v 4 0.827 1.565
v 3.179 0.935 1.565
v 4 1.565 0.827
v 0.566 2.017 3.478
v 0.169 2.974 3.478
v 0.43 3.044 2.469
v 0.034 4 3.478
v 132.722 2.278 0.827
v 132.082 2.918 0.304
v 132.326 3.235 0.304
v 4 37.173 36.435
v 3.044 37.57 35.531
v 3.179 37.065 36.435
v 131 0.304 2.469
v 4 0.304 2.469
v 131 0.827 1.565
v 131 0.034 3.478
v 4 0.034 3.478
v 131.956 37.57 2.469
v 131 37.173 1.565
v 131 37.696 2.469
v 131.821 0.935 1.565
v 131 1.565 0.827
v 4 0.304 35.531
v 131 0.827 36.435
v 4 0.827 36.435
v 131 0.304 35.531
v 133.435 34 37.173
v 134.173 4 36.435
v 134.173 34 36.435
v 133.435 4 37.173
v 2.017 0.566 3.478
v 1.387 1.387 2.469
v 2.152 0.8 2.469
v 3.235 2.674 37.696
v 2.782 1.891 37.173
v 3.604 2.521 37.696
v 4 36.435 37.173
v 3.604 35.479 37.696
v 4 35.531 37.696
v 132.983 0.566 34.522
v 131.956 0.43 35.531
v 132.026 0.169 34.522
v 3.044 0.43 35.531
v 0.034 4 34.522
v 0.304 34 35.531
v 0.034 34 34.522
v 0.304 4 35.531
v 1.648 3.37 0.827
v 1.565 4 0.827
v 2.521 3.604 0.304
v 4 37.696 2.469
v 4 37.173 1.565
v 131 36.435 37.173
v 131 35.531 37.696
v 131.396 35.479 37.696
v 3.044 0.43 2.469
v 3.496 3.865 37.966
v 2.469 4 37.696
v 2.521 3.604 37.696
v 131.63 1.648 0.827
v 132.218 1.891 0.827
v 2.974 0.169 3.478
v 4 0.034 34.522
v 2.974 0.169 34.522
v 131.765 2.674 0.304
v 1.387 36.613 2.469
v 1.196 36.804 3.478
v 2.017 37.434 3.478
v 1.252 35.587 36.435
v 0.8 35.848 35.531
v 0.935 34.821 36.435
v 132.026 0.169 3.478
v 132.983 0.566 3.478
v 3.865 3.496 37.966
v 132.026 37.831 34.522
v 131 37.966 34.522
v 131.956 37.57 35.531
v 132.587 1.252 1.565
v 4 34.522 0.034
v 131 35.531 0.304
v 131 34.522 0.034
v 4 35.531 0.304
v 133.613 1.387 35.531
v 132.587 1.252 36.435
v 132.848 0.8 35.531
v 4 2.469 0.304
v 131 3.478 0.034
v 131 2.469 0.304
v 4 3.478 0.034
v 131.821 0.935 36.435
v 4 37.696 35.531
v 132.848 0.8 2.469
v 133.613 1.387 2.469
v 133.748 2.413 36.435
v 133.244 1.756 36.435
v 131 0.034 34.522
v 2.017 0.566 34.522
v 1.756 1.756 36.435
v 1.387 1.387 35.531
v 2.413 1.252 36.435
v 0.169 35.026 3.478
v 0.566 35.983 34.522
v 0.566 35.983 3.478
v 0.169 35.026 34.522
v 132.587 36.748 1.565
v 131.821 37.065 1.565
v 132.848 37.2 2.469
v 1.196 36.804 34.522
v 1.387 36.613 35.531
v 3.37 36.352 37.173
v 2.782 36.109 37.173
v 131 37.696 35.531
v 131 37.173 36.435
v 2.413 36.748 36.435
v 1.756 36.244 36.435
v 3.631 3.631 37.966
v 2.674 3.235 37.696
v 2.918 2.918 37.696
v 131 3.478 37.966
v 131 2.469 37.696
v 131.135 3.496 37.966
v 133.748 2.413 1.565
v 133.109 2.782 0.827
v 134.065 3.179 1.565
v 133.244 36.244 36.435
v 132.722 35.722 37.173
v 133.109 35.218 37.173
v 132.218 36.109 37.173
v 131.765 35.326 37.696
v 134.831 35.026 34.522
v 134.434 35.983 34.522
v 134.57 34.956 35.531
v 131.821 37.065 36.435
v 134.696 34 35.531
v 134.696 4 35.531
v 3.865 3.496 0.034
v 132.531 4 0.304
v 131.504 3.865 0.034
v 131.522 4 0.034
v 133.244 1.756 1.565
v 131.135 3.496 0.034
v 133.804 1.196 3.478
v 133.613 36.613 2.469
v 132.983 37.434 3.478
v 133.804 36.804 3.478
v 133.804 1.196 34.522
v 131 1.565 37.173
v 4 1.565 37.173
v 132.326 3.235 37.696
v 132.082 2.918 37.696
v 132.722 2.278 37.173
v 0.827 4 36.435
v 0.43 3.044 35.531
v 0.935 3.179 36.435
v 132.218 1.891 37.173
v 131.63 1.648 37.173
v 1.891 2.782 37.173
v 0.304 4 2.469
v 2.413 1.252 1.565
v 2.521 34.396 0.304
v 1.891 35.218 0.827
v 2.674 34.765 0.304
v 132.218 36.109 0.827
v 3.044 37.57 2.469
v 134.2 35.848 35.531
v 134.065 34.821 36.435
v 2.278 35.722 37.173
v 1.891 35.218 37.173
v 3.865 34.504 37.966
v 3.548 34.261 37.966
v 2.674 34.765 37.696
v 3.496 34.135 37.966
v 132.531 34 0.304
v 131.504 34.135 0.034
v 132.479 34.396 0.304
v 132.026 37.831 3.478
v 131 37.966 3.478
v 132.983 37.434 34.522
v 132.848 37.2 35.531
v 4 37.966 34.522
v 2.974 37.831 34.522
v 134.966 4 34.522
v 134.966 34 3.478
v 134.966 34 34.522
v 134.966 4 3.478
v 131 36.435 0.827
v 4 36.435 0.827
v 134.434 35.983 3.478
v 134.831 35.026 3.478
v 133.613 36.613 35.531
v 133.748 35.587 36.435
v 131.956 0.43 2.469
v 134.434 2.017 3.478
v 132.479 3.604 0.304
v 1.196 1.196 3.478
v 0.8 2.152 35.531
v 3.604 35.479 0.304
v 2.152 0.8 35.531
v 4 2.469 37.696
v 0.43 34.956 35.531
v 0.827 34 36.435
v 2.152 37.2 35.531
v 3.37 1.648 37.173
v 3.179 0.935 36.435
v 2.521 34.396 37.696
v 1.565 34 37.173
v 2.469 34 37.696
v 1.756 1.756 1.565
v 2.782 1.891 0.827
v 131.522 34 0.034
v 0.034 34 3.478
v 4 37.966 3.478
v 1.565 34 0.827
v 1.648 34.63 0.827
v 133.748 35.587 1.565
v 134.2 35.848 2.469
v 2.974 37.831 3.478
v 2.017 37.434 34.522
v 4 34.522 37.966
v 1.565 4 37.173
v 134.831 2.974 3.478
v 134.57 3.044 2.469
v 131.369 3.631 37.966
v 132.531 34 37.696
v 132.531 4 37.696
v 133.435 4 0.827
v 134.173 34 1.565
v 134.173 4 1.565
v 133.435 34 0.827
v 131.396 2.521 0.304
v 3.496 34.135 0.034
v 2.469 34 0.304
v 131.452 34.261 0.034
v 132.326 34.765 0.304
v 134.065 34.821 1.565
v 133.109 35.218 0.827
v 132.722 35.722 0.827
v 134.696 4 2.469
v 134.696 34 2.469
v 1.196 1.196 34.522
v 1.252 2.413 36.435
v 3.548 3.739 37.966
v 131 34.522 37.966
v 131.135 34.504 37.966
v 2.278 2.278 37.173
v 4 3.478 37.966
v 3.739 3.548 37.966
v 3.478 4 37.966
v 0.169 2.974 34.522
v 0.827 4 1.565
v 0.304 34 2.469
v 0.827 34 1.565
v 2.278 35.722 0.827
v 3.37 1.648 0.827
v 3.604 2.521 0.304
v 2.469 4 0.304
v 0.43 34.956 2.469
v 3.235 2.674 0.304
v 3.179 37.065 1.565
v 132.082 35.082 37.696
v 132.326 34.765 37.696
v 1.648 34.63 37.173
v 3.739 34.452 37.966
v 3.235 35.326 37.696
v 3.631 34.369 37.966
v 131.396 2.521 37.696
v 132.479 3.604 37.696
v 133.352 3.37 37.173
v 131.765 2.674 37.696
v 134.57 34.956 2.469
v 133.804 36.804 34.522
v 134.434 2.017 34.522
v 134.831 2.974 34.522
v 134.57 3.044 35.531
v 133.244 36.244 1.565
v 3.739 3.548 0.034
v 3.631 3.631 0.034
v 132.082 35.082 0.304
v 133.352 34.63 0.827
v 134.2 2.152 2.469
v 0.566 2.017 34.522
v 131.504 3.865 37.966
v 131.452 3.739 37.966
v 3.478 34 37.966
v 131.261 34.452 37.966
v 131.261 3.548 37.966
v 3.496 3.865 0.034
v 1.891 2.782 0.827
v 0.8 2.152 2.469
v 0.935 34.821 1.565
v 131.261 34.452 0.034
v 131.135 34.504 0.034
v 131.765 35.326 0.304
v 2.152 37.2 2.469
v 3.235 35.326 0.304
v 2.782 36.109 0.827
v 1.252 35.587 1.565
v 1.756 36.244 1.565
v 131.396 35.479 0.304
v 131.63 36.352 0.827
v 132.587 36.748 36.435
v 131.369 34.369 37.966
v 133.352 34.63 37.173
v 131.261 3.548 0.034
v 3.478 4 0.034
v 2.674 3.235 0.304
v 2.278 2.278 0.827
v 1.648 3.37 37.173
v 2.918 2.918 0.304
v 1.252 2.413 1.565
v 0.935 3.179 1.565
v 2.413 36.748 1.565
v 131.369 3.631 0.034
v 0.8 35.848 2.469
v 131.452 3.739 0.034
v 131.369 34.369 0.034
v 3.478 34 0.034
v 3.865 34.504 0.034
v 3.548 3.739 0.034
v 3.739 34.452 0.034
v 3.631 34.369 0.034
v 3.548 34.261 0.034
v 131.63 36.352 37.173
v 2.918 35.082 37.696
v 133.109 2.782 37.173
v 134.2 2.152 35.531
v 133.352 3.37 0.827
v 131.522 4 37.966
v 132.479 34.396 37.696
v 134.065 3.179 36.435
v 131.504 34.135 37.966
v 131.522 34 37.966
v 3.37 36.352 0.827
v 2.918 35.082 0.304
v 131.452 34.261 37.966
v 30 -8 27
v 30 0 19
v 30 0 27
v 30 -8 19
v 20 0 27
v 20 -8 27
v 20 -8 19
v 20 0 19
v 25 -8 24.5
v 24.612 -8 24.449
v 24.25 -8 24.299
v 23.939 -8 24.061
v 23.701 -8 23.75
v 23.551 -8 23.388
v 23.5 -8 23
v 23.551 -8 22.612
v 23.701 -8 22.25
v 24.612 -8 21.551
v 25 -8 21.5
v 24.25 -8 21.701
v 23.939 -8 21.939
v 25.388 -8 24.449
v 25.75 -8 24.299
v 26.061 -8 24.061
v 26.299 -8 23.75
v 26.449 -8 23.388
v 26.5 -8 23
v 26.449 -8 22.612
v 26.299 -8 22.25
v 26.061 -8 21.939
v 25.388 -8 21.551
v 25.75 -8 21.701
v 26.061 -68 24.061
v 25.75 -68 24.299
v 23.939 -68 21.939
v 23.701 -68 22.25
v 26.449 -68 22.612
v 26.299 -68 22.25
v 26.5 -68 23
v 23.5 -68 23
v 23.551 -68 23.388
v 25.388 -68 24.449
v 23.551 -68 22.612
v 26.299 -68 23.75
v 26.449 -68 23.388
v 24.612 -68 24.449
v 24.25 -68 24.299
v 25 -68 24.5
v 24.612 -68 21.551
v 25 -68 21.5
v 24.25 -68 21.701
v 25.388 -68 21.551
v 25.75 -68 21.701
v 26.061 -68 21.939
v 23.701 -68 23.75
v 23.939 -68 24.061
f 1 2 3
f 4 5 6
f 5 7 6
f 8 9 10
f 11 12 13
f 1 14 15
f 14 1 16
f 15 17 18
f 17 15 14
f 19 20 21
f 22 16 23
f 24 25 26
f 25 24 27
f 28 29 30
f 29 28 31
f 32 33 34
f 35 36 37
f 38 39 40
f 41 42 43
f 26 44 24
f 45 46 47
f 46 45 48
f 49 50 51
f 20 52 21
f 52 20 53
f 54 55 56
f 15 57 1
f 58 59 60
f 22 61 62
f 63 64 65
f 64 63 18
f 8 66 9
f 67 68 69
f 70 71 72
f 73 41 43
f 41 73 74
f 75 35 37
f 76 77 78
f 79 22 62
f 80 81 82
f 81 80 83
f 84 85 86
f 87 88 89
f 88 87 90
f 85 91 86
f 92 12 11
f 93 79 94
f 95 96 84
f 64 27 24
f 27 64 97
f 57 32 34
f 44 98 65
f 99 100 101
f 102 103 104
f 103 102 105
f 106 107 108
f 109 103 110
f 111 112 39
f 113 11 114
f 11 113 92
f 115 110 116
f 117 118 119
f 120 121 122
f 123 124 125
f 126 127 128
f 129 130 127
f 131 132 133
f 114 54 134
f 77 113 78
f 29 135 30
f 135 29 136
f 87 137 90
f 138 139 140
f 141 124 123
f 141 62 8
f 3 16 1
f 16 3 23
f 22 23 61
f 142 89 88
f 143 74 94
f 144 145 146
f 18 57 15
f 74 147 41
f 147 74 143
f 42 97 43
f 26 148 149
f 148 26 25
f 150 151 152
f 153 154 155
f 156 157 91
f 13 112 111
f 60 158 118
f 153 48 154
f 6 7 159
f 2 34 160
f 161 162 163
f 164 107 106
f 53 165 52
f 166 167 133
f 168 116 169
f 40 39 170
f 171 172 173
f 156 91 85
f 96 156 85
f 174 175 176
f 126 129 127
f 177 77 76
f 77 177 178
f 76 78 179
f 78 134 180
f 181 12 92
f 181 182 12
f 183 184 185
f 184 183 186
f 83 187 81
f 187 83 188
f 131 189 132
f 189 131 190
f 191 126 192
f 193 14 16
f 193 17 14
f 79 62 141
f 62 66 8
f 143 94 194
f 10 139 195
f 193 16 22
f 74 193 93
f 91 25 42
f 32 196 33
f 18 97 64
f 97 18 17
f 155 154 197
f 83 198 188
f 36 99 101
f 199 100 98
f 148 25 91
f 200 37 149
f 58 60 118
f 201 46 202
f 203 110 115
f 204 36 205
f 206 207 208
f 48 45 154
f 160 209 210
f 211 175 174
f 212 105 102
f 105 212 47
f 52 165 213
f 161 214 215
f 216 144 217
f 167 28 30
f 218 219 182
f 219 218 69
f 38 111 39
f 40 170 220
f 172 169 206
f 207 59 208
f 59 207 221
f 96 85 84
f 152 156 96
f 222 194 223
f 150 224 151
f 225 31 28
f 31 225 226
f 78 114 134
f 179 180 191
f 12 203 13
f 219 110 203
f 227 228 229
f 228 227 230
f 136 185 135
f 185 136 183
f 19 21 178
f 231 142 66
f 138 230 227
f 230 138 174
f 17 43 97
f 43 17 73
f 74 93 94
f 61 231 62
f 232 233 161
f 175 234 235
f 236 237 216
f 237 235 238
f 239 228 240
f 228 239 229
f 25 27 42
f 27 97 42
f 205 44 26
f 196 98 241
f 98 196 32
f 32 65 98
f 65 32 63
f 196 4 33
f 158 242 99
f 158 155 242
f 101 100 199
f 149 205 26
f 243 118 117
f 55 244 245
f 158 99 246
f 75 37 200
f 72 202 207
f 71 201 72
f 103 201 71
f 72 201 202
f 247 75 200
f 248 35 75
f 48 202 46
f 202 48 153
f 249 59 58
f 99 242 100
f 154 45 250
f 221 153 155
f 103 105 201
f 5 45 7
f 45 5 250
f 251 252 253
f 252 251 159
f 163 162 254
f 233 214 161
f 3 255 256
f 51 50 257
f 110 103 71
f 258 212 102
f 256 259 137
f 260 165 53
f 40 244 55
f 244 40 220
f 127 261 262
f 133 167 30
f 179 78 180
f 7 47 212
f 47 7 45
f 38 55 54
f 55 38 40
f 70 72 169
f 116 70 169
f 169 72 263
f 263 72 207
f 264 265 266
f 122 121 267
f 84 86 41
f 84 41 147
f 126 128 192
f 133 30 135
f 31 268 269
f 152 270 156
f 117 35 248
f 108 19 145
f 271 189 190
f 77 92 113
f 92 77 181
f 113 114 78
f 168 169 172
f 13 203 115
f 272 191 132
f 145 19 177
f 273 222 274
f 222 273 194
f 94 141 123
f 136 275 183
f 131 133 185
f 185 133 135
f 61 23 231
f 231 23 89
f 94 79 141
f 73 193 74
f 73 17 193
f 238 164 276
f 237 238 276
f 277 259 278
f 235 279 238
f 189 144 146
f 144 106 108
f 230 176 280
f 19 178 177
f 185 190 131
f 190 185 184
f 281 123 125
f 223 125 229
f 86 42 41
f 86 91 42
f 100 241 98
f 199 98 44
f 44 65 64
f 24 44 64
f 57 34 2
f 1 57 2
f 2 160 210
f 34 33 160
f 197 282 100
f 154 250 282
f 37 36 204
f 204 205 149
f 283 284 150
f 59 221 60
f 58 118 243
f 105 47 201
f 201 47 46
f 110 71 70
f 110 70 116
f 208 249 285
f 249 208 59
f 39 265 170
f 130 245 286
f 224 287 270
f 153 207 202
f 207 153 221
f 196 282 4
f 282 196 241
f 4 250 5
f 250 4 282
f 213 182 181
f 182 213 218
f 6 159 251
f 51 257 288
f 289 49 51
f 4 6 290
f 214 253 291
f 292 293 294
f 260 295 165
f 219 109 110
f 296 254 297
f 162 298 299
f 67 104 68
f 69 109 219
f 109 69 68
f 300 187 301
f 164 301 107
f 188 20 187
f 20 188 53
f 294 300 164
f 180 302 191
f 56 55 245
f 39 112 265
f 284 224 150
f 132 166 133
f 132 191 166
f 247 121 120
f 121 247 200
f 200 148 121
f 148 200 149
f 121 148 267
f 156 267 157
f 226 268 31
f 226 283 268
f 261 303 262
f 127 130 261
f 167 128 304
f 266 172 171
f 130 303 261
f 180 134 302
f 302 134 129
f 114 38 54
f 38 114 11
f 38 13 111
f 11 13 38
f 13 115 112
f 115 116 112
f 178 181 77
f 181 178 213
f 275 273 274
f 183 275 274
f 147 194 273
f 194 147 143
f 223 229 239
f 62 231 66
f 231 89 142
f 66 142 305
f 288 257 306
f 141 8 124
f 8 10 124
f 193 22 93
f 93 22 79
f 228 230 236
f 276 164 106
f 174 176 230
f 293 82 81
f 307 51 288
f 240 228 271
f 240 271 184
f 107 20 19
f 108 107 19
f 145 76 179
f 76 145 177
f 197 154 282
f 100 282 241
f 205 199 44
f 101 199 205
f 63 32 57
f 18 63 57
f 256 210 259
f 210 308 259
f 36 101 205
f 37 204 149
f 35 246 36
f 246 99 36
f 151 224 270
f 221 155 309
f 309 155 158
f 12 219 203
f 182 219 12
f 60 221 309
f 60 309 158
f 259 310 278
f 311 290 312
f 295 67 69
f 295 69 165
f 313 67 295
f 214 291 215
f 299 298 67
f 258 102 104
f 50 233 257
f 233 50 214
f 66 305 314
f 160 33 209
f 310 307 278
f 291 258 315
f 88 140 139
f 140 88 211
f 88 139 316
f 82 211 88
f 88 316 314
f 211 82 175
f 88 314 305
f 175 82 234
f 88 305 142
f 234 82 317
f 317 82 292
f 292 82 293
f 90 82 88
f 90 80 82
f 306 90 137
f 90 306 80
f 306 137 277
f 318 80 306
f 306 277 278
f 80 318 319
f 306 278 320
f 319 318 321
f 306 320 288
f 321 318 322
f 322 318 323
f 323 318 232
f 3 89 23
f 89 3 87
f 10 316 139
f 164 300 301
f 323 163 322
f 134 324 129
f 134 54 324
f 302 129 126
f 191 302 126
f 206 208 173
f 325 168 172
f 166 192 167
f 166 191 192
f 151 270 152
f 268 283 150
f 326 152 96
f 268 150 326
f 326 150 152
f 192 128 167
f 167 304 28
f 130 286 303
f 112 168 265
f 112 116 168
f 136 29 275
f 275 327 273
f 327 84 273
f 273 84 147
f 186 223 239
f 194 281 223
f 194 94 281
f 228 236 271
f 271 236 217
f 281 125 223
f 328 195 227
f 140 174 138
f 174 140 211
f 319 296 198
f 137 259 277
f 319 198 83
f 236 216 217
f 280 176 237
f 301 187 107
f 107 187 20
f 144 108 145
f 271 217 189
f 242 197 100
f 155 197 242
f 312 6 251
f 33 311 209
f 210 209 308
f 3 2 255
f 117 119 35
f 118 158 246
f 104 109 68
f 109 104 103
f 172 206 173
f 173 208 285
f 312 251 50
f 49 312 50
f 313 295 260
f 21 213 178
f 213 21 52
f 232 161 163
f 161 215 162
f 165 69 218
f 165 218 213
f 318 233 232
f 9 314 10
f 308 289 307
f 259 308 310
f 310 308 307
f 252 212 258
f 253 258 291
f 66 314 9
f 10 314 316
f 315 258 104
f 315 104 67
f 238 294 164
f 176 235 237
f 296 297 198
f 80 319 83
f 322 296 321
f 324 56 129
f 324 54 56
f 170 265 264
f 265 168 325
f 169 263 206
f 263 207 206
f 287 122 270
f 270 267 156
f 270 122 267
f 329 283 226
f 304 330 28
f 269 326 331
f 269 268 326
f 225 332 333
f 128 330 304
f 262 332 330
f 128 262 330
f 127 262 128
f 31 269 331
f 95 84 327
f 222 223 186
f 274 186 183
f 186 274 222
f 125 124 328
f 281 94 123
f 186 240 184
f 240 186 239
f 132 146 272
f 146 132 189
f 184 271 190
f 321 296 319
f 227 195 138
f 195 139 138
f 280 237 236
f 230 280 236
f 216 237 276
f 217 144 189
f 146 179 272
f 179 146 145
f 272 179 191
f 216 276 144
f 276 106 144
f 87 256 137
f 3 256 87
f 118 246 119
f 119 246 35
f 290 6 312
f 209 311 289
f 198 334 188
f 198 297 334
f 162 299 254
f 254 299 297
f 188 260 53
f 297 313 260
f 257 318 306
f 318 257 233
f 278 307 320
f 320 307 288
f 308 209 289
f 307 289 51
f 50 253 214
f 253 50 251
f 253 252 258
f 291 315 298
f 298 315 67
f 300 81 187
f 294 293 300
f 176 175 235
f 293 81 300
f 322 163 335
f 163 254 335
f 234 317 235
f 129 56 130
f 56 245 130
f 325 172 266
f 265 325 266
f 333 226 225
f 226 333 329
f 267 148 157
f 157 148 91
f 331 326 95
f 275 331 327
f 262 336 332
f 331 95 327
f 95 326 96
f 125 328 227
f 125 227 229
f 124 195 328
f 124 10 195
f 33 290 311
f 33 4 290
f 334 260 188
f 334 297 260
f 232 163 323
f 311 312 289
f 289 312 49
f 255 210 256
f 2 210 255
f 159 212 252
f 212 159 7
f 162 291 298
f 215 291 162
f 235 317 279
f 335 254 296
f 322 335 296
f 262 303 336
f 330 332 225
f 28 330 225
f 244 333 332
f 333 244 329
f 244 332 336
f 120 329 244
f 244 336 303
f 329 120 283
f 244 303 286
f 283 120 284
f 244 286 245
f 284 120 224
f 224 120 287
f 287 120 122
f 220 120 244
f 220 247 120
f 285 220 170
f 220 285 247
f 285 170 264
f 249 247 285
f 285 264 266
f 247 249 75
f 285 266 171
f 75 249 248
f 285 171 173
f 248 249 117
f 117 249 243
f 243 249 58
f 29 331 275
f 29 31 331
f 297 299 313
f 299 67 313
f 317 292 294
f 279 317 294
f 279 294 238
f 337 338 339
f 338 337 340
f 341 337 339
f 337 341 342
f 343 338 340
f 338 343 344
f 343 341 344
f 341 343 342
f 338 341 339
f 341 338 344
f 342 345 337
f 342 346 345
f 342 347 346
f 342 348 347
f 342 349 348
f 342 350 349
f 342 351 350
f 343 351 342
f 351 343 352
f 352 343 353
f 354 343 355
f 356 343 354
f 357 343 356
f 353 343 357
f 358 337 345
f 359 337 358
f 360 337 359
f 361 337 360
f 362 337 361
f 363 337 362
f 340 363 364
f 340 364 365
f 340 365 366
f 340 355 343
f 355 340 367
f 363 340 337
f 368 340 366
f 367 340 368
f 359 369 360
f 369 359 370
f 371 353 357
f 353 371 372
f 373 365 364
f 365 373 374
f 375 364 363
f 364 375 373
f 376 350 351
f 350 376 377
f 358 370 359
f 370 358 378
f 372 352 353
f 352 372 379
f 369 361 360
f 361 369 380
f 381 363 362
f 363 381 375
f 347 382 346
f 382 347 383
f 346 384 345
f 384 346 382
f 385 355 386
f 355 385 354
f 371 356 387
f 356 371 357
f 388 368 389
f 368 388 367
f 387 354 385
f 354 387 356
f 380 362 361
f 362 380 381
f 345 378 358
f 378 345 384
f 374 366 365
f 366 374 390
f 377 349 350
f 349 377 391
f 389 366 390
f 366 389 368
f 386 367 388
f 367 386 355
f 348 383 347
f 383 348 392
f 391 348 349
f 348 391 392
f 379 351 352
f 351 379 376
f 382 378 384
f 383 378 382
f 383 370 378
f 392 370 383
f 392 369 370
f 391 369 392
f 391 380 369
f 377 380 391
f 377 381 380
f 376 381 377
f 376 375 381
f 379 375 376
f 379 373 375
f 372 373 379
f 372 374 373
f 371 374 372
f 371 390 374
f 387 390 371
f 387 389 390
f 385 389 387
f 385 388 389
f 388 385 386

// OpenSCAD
// Battery Pack — BRR-2P4S-5200 (14.4V, 5200mAh, 4S2P Li-ion)
// Roborock S5 / S6 / S7 / Xiaomi Mijia 1/1S/1C/1T/G1 and compatibles
//
// Datasheet-confirmed:  135 x 38 x 38 mm (per Amazon listings,
//   "Dimensions: 135 x 38 x 38 mm" — see MEASURE-ME.md for
//   caveat; another source gives 137 x 43 x 45 mm)
// All other dimensions (estimate).
//
// Licensed CC0 — use freely.

// ===== PARAMETERS =====

// Overall bounding box (datasheet: 135 x 38 x 38 mm per Amazon listing)
pack_length    = 135;   // mm (datasheet) — longest axis, along insertion direction
pack_width     =  38;   // mm (datasheet) — narrowest side
pack_height    =  38;   // mm (datasheet) — same as width for square prism

// Corner radius (estimate: typical Li-ion pack has R3-R5 corners)
corner_r       =   4;   // mm (estimate)

// Connector block (estimate: 2-pin or 4-pin JST-style, protruding from pack face)
connector_w    =  10;   // mm (estimate) — connector body width
connector_d    =   8;   // mm (estimate) — connector body depth (protrusion from pack)
connector_h    =   8;   // mm (estimate) — connector body height
connector_ofs_x =  20;  // mm (estimate) — connector center offset from pack edge
connector_ofs_z =  19;  // mm (estimate) — connector center offset from pack bottom

// Cable harness stub (estimate)
cable_len      =  60;   // mm (estimate) — total cable length from connector
cable_dia      =   3;   // mm (estimate) — wire gauge ~18 AWG

// Label / recess detail (aesthetic, not structural)
label_w        =  70;   // mm (estimate)
label_h        =  20;   // mm (estimate)
label_d        =   0.5; // mm (estimate) — recess depth

// Screw boss locations (if any at pack ends — estimate)
screw_boss_dia =   3.2; // mm (estimate) — M3 clearance
screw_boss_h   =   5;   // mm (estimate) — boss height from pack body
screw_ofs      =   5;   // mm (estimate) — inset from corner
has_screw_bosses = false; // set true if pack has mounting ears

// Assembly facets
$fn = 24;

// ===== MODULES =====

module rounded_box(x, y, z, r) {
    hull() {
        for (dx = [r, x - r])
            for (dy = [r, y - r])
                for (dz = [r, z - r])
                    translate([dx, dy, dz])
                        sphere(r=r);
    }
}

module battery_label(recess_depth) {
    // Shallow recess representing the printed label area
    translate([connector_ofs_x + 15, pack_width + 0.01, 4])
        cube([label_w, recess_depth, label_h]);
}

module connector_block() {
    // JST-style connector protruding from the front face
    translate([connector_ofs_x, -connector_d, connector_ofs_z])
        cube([connector_w, connector_d, connector_h]);
}

module cable_stub() {
    // Short stub of cable exiting the connector
    translate([connector_ofs_x + connector_w/2, -(connector_d + cable_len), connector_ofs_z + connector_h/2])
        rotate([-90, 0, 0])
            cylinder(h=cable_len, d=cable_dia);
}

module screw_boss(x, y) {
    translate([x, y, pack_height])
        cylinder(h=screw_boss_h, d=screw_boss_dia);
}

// ===== ASSEMBLY =====

module battery_pack() {
    union() {
        // Main body — rounded rectangular prism
        rounded_box(pack_length, pack_width, pack_height, corner_r);
        
        // Connector
        connector_block();
        
        // Cable stub (shown as thin cylinder — not to scale)
        cable_stub();
        
        // Optional screw bosses
        if (has_screw_bosses) {
            screw_boss(screw_ofs, screw_ofs);
            screw_boss(screw_ofs, pack_width - screw_ofs);
            screw_boss(pack_length - screw_ofs, pack_width - screw_ofs);
            screw_boss(pack_length - screw_ofs, screw_ofs);
        }
    }
}

// ===== RENDER =====
battery_pack();

// ===== NOTES =====
// (1) Dimensions from Amazon listing for BRR-2P4S-5200S replacement battery.
//     However, an AliExpress hardware-review blog lists 137 x 43 x 45 mm.
//     MEASURE with calipers.
//
// (2) Connector type uncertain: BOM says 4-pin (B+, B-, NTC, sense), but
//     many aftermarket batteries use a 2-pin (B+, B-) connector only.
//     MEASURE actual connector on the purchased part.
//
// (3) Cell arrangement: 18650 4S2P. Internal cell count = 8.
//     Approx cell layout: 2 parallel x 4 series = 2-wide, 4-long.
//     BMS board sits at one end of the pack.
